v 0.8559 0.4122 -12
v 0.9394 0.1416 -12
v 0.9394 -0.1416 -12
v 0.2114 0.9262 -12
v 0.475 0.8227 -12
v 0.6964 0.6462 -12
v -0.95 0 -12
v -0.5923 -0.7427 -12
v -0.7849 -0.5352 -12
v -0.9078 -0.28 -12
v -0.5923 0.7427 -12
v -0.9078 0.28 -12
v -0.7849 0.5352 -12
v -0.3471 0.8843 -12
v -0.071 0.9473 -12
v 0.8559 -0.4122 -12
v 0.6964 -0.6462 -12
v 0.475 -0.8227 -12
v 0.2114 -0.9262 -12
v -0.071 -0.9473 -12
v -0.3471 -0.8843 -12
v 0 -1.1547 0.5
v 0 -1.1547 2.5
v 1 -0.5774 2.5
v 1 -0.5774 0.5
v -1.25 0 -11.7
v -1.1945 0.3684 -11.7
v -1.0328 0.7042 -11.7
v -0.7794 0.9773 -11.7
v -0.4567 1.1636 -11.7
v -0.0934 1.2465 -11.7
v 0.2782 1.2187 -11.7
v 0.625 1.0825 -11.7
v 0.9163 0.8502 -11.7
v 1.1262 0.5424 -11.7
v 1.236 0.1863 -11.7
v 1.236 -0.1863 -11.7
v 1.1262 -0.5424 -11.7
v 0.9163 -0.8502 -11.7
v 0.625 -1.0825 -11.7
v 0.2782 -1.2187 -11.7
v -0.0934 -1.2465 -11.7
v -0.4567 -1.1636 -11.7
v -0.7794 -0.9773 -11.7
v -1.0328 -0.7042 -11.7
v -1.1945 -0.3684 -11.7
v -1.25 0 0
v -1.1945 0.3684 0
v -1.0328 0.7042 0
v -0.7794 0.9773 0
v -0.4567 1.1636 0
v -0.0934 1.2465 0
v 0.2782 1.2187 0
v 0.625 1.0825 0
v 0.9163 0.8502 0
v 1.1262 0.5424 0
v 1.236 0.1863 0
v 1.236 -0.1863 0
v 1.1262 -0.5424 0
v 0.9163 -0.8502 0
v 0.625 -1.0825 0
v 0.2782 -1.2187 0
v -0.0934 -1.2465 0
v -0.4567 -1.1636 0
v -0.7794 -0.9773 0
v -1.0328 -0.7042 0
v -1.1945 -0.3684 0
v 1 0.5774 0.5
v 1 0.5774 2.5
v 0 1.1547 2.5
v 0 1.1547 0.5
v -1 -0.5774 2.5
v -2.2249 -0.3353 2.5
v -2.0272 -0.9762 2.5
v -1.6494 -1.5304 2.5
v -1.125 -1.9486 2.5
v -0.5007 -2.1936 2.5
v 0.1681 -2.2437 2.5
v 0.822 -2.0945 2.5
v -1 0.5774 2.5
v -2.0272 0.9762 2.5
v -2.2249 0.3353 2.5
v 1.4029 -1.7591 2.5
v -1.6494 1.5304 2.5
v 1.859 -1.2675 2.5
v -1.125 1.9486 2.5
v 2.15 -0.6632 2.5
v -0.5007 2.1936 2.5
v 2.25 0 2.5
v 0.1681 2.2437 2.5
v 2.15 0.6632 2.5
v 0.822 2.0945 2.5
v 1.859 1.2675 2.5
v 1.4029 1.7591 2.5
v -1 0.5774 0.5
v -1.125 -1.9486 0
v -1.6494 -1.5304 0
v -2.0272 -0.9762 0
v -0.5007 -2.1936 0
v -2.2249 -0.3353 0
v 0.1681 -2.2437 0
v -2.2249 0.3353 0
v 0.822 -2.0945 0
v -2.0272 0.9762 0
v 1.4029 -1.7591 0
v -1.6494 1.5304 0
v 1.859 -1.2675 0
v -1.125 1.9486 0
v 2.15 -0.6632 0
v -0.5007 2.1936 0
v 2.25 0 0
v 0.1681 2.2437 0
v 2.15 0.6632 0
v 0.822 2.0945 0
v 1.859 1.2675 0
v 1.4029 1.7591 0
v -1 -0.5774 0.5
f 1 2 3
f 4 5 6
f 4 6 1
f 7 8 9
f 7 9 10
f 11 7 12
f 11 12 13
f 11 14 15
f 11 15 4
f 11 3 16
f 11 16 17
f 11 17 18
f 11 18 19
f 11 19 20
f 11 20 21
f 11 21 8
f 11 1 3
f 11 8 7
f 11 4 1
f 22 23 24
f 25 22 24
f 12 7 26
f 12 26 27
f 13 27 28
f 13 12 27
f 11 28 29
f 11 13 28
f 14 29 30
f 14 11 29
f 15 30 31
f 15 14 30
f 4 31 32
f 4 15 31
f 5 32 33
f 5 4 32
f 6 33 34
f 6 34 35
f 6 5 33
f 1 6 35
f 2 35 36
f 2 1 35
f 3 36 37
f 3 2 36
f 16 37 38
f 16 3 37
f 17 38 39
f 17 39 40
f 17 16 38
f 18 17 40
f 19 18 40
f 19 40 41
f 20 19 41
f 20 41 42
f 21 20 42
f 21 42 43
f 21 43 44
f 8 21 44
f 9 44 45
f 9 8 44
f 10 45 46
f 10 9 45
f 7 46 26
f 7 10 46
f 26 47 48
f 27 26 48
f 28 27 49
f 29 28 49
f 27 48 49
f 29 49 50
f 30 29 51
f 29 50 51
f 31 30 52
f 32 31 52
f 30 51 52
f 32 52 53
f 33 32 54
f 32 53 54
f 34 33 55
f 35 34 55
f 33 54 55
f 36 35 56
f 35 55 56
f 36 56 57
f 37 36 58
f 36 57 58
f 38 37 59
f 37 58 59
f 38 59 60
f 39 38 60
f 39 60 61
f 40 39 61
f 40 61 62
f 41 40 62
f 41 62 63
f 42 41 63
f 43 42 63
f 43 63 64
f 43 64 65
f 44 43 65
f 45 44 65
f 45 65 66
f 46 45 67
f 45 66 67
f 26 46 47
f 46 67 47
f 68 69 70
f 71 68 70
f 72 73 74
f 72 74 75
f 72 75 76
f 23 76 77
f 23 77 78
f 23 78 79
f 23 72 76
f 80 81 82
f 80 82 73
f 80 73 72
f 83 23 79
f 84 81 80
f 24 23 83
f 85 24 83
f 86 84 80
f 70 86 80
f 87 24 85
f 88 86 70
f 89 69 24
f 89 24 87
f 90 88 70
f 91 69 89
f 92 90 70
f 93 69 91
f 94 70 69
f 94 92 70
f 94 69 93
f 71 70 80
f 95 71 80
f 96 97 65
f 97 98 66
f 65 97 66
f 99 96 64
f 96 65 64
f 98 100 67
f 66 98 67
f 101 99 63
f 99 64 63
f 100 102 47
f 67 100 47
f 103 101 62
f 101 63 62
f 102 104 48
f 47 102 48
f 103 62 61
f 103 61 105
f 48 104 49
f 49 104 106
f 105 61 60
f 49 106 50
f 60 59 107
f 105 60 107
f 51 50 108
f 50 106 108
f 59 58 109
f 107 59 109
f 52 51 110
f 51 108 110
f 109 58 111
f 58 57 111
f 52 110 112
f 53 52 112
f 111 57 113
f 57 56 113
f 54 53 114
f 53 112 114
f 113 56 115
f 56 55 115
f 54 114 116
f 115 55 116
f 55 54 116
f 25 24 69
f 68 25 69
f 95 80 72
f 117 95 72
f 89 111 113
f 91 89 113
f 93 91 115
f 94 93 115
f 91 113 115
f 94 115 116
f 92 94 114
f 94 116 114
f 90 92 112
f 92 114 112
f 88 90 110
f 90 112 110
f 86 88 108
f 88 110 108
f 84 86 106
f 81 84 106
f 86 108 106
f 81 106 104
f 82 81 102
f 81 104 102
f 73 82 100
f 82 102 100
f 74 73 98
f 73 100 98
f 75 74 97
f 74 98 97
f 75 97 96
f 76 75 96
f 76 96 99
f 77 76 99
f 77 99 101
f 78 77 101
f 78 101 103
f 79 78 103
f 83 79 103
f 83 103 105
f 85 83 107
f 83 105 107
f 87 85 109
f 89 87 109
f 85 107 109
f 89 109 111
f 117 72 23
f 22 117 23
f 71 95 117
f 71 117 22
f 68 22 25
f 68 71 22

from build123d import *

# Parameters (mm, degrees)
SKETCH1_R           = 2.25
BOSS_EXTRUDE1_DEPTH = 2.5
SKETCH2_R           = 1.25
BOSS_EXTRUDE2_DEPTH = 12
CHAMFER1_SIZE       = 0.3
CUT_EXTRUDE1_DEPTH  = 2


with BuildPart() as part:
    # Sketch1 → Boss-Extrude1 (new body)
    with BuildSketch(Plane.XY):
        Circle(SKETCH1_R)
    extrude(amount=BOSS_EXTRUDE1_DEPTH)

    # Sketch2 → Boss-Extrude2 (add)
    with BuildSketch(Plane(origin=(0, 0, 0), x_dir=(-1, 0, 0), z_dir=(0, 0, -1))):
        Circle(SKETCH2_R)
    extrude(amount=BOSS_EXTRUDE2_DEPTH)

    # Chamfer1
    chamfer1_edges = [part.edges().sort_by_distance(p)[0] for p in [
        (1.25, 0, -12),
    ]]
    chamfer(chamfer1_edges, length=CHAMFER1_SIZE)

    # Sketch3 → Cut-Extrude1 (cut)
    with BuildSketch(Plane.XY.offset(2.5)):
        Polygon((0, 1.154700538), (-1, 0.577350269), (-1, -0.577350269), (0, -1.154700538), (1, -0.577350269), (1, 0.577350269), align=None)
    extrude(amount=-CUT_EXTRUDE1_DEPTH, mode=Mode.SUBTRACT)


solid = part.part
